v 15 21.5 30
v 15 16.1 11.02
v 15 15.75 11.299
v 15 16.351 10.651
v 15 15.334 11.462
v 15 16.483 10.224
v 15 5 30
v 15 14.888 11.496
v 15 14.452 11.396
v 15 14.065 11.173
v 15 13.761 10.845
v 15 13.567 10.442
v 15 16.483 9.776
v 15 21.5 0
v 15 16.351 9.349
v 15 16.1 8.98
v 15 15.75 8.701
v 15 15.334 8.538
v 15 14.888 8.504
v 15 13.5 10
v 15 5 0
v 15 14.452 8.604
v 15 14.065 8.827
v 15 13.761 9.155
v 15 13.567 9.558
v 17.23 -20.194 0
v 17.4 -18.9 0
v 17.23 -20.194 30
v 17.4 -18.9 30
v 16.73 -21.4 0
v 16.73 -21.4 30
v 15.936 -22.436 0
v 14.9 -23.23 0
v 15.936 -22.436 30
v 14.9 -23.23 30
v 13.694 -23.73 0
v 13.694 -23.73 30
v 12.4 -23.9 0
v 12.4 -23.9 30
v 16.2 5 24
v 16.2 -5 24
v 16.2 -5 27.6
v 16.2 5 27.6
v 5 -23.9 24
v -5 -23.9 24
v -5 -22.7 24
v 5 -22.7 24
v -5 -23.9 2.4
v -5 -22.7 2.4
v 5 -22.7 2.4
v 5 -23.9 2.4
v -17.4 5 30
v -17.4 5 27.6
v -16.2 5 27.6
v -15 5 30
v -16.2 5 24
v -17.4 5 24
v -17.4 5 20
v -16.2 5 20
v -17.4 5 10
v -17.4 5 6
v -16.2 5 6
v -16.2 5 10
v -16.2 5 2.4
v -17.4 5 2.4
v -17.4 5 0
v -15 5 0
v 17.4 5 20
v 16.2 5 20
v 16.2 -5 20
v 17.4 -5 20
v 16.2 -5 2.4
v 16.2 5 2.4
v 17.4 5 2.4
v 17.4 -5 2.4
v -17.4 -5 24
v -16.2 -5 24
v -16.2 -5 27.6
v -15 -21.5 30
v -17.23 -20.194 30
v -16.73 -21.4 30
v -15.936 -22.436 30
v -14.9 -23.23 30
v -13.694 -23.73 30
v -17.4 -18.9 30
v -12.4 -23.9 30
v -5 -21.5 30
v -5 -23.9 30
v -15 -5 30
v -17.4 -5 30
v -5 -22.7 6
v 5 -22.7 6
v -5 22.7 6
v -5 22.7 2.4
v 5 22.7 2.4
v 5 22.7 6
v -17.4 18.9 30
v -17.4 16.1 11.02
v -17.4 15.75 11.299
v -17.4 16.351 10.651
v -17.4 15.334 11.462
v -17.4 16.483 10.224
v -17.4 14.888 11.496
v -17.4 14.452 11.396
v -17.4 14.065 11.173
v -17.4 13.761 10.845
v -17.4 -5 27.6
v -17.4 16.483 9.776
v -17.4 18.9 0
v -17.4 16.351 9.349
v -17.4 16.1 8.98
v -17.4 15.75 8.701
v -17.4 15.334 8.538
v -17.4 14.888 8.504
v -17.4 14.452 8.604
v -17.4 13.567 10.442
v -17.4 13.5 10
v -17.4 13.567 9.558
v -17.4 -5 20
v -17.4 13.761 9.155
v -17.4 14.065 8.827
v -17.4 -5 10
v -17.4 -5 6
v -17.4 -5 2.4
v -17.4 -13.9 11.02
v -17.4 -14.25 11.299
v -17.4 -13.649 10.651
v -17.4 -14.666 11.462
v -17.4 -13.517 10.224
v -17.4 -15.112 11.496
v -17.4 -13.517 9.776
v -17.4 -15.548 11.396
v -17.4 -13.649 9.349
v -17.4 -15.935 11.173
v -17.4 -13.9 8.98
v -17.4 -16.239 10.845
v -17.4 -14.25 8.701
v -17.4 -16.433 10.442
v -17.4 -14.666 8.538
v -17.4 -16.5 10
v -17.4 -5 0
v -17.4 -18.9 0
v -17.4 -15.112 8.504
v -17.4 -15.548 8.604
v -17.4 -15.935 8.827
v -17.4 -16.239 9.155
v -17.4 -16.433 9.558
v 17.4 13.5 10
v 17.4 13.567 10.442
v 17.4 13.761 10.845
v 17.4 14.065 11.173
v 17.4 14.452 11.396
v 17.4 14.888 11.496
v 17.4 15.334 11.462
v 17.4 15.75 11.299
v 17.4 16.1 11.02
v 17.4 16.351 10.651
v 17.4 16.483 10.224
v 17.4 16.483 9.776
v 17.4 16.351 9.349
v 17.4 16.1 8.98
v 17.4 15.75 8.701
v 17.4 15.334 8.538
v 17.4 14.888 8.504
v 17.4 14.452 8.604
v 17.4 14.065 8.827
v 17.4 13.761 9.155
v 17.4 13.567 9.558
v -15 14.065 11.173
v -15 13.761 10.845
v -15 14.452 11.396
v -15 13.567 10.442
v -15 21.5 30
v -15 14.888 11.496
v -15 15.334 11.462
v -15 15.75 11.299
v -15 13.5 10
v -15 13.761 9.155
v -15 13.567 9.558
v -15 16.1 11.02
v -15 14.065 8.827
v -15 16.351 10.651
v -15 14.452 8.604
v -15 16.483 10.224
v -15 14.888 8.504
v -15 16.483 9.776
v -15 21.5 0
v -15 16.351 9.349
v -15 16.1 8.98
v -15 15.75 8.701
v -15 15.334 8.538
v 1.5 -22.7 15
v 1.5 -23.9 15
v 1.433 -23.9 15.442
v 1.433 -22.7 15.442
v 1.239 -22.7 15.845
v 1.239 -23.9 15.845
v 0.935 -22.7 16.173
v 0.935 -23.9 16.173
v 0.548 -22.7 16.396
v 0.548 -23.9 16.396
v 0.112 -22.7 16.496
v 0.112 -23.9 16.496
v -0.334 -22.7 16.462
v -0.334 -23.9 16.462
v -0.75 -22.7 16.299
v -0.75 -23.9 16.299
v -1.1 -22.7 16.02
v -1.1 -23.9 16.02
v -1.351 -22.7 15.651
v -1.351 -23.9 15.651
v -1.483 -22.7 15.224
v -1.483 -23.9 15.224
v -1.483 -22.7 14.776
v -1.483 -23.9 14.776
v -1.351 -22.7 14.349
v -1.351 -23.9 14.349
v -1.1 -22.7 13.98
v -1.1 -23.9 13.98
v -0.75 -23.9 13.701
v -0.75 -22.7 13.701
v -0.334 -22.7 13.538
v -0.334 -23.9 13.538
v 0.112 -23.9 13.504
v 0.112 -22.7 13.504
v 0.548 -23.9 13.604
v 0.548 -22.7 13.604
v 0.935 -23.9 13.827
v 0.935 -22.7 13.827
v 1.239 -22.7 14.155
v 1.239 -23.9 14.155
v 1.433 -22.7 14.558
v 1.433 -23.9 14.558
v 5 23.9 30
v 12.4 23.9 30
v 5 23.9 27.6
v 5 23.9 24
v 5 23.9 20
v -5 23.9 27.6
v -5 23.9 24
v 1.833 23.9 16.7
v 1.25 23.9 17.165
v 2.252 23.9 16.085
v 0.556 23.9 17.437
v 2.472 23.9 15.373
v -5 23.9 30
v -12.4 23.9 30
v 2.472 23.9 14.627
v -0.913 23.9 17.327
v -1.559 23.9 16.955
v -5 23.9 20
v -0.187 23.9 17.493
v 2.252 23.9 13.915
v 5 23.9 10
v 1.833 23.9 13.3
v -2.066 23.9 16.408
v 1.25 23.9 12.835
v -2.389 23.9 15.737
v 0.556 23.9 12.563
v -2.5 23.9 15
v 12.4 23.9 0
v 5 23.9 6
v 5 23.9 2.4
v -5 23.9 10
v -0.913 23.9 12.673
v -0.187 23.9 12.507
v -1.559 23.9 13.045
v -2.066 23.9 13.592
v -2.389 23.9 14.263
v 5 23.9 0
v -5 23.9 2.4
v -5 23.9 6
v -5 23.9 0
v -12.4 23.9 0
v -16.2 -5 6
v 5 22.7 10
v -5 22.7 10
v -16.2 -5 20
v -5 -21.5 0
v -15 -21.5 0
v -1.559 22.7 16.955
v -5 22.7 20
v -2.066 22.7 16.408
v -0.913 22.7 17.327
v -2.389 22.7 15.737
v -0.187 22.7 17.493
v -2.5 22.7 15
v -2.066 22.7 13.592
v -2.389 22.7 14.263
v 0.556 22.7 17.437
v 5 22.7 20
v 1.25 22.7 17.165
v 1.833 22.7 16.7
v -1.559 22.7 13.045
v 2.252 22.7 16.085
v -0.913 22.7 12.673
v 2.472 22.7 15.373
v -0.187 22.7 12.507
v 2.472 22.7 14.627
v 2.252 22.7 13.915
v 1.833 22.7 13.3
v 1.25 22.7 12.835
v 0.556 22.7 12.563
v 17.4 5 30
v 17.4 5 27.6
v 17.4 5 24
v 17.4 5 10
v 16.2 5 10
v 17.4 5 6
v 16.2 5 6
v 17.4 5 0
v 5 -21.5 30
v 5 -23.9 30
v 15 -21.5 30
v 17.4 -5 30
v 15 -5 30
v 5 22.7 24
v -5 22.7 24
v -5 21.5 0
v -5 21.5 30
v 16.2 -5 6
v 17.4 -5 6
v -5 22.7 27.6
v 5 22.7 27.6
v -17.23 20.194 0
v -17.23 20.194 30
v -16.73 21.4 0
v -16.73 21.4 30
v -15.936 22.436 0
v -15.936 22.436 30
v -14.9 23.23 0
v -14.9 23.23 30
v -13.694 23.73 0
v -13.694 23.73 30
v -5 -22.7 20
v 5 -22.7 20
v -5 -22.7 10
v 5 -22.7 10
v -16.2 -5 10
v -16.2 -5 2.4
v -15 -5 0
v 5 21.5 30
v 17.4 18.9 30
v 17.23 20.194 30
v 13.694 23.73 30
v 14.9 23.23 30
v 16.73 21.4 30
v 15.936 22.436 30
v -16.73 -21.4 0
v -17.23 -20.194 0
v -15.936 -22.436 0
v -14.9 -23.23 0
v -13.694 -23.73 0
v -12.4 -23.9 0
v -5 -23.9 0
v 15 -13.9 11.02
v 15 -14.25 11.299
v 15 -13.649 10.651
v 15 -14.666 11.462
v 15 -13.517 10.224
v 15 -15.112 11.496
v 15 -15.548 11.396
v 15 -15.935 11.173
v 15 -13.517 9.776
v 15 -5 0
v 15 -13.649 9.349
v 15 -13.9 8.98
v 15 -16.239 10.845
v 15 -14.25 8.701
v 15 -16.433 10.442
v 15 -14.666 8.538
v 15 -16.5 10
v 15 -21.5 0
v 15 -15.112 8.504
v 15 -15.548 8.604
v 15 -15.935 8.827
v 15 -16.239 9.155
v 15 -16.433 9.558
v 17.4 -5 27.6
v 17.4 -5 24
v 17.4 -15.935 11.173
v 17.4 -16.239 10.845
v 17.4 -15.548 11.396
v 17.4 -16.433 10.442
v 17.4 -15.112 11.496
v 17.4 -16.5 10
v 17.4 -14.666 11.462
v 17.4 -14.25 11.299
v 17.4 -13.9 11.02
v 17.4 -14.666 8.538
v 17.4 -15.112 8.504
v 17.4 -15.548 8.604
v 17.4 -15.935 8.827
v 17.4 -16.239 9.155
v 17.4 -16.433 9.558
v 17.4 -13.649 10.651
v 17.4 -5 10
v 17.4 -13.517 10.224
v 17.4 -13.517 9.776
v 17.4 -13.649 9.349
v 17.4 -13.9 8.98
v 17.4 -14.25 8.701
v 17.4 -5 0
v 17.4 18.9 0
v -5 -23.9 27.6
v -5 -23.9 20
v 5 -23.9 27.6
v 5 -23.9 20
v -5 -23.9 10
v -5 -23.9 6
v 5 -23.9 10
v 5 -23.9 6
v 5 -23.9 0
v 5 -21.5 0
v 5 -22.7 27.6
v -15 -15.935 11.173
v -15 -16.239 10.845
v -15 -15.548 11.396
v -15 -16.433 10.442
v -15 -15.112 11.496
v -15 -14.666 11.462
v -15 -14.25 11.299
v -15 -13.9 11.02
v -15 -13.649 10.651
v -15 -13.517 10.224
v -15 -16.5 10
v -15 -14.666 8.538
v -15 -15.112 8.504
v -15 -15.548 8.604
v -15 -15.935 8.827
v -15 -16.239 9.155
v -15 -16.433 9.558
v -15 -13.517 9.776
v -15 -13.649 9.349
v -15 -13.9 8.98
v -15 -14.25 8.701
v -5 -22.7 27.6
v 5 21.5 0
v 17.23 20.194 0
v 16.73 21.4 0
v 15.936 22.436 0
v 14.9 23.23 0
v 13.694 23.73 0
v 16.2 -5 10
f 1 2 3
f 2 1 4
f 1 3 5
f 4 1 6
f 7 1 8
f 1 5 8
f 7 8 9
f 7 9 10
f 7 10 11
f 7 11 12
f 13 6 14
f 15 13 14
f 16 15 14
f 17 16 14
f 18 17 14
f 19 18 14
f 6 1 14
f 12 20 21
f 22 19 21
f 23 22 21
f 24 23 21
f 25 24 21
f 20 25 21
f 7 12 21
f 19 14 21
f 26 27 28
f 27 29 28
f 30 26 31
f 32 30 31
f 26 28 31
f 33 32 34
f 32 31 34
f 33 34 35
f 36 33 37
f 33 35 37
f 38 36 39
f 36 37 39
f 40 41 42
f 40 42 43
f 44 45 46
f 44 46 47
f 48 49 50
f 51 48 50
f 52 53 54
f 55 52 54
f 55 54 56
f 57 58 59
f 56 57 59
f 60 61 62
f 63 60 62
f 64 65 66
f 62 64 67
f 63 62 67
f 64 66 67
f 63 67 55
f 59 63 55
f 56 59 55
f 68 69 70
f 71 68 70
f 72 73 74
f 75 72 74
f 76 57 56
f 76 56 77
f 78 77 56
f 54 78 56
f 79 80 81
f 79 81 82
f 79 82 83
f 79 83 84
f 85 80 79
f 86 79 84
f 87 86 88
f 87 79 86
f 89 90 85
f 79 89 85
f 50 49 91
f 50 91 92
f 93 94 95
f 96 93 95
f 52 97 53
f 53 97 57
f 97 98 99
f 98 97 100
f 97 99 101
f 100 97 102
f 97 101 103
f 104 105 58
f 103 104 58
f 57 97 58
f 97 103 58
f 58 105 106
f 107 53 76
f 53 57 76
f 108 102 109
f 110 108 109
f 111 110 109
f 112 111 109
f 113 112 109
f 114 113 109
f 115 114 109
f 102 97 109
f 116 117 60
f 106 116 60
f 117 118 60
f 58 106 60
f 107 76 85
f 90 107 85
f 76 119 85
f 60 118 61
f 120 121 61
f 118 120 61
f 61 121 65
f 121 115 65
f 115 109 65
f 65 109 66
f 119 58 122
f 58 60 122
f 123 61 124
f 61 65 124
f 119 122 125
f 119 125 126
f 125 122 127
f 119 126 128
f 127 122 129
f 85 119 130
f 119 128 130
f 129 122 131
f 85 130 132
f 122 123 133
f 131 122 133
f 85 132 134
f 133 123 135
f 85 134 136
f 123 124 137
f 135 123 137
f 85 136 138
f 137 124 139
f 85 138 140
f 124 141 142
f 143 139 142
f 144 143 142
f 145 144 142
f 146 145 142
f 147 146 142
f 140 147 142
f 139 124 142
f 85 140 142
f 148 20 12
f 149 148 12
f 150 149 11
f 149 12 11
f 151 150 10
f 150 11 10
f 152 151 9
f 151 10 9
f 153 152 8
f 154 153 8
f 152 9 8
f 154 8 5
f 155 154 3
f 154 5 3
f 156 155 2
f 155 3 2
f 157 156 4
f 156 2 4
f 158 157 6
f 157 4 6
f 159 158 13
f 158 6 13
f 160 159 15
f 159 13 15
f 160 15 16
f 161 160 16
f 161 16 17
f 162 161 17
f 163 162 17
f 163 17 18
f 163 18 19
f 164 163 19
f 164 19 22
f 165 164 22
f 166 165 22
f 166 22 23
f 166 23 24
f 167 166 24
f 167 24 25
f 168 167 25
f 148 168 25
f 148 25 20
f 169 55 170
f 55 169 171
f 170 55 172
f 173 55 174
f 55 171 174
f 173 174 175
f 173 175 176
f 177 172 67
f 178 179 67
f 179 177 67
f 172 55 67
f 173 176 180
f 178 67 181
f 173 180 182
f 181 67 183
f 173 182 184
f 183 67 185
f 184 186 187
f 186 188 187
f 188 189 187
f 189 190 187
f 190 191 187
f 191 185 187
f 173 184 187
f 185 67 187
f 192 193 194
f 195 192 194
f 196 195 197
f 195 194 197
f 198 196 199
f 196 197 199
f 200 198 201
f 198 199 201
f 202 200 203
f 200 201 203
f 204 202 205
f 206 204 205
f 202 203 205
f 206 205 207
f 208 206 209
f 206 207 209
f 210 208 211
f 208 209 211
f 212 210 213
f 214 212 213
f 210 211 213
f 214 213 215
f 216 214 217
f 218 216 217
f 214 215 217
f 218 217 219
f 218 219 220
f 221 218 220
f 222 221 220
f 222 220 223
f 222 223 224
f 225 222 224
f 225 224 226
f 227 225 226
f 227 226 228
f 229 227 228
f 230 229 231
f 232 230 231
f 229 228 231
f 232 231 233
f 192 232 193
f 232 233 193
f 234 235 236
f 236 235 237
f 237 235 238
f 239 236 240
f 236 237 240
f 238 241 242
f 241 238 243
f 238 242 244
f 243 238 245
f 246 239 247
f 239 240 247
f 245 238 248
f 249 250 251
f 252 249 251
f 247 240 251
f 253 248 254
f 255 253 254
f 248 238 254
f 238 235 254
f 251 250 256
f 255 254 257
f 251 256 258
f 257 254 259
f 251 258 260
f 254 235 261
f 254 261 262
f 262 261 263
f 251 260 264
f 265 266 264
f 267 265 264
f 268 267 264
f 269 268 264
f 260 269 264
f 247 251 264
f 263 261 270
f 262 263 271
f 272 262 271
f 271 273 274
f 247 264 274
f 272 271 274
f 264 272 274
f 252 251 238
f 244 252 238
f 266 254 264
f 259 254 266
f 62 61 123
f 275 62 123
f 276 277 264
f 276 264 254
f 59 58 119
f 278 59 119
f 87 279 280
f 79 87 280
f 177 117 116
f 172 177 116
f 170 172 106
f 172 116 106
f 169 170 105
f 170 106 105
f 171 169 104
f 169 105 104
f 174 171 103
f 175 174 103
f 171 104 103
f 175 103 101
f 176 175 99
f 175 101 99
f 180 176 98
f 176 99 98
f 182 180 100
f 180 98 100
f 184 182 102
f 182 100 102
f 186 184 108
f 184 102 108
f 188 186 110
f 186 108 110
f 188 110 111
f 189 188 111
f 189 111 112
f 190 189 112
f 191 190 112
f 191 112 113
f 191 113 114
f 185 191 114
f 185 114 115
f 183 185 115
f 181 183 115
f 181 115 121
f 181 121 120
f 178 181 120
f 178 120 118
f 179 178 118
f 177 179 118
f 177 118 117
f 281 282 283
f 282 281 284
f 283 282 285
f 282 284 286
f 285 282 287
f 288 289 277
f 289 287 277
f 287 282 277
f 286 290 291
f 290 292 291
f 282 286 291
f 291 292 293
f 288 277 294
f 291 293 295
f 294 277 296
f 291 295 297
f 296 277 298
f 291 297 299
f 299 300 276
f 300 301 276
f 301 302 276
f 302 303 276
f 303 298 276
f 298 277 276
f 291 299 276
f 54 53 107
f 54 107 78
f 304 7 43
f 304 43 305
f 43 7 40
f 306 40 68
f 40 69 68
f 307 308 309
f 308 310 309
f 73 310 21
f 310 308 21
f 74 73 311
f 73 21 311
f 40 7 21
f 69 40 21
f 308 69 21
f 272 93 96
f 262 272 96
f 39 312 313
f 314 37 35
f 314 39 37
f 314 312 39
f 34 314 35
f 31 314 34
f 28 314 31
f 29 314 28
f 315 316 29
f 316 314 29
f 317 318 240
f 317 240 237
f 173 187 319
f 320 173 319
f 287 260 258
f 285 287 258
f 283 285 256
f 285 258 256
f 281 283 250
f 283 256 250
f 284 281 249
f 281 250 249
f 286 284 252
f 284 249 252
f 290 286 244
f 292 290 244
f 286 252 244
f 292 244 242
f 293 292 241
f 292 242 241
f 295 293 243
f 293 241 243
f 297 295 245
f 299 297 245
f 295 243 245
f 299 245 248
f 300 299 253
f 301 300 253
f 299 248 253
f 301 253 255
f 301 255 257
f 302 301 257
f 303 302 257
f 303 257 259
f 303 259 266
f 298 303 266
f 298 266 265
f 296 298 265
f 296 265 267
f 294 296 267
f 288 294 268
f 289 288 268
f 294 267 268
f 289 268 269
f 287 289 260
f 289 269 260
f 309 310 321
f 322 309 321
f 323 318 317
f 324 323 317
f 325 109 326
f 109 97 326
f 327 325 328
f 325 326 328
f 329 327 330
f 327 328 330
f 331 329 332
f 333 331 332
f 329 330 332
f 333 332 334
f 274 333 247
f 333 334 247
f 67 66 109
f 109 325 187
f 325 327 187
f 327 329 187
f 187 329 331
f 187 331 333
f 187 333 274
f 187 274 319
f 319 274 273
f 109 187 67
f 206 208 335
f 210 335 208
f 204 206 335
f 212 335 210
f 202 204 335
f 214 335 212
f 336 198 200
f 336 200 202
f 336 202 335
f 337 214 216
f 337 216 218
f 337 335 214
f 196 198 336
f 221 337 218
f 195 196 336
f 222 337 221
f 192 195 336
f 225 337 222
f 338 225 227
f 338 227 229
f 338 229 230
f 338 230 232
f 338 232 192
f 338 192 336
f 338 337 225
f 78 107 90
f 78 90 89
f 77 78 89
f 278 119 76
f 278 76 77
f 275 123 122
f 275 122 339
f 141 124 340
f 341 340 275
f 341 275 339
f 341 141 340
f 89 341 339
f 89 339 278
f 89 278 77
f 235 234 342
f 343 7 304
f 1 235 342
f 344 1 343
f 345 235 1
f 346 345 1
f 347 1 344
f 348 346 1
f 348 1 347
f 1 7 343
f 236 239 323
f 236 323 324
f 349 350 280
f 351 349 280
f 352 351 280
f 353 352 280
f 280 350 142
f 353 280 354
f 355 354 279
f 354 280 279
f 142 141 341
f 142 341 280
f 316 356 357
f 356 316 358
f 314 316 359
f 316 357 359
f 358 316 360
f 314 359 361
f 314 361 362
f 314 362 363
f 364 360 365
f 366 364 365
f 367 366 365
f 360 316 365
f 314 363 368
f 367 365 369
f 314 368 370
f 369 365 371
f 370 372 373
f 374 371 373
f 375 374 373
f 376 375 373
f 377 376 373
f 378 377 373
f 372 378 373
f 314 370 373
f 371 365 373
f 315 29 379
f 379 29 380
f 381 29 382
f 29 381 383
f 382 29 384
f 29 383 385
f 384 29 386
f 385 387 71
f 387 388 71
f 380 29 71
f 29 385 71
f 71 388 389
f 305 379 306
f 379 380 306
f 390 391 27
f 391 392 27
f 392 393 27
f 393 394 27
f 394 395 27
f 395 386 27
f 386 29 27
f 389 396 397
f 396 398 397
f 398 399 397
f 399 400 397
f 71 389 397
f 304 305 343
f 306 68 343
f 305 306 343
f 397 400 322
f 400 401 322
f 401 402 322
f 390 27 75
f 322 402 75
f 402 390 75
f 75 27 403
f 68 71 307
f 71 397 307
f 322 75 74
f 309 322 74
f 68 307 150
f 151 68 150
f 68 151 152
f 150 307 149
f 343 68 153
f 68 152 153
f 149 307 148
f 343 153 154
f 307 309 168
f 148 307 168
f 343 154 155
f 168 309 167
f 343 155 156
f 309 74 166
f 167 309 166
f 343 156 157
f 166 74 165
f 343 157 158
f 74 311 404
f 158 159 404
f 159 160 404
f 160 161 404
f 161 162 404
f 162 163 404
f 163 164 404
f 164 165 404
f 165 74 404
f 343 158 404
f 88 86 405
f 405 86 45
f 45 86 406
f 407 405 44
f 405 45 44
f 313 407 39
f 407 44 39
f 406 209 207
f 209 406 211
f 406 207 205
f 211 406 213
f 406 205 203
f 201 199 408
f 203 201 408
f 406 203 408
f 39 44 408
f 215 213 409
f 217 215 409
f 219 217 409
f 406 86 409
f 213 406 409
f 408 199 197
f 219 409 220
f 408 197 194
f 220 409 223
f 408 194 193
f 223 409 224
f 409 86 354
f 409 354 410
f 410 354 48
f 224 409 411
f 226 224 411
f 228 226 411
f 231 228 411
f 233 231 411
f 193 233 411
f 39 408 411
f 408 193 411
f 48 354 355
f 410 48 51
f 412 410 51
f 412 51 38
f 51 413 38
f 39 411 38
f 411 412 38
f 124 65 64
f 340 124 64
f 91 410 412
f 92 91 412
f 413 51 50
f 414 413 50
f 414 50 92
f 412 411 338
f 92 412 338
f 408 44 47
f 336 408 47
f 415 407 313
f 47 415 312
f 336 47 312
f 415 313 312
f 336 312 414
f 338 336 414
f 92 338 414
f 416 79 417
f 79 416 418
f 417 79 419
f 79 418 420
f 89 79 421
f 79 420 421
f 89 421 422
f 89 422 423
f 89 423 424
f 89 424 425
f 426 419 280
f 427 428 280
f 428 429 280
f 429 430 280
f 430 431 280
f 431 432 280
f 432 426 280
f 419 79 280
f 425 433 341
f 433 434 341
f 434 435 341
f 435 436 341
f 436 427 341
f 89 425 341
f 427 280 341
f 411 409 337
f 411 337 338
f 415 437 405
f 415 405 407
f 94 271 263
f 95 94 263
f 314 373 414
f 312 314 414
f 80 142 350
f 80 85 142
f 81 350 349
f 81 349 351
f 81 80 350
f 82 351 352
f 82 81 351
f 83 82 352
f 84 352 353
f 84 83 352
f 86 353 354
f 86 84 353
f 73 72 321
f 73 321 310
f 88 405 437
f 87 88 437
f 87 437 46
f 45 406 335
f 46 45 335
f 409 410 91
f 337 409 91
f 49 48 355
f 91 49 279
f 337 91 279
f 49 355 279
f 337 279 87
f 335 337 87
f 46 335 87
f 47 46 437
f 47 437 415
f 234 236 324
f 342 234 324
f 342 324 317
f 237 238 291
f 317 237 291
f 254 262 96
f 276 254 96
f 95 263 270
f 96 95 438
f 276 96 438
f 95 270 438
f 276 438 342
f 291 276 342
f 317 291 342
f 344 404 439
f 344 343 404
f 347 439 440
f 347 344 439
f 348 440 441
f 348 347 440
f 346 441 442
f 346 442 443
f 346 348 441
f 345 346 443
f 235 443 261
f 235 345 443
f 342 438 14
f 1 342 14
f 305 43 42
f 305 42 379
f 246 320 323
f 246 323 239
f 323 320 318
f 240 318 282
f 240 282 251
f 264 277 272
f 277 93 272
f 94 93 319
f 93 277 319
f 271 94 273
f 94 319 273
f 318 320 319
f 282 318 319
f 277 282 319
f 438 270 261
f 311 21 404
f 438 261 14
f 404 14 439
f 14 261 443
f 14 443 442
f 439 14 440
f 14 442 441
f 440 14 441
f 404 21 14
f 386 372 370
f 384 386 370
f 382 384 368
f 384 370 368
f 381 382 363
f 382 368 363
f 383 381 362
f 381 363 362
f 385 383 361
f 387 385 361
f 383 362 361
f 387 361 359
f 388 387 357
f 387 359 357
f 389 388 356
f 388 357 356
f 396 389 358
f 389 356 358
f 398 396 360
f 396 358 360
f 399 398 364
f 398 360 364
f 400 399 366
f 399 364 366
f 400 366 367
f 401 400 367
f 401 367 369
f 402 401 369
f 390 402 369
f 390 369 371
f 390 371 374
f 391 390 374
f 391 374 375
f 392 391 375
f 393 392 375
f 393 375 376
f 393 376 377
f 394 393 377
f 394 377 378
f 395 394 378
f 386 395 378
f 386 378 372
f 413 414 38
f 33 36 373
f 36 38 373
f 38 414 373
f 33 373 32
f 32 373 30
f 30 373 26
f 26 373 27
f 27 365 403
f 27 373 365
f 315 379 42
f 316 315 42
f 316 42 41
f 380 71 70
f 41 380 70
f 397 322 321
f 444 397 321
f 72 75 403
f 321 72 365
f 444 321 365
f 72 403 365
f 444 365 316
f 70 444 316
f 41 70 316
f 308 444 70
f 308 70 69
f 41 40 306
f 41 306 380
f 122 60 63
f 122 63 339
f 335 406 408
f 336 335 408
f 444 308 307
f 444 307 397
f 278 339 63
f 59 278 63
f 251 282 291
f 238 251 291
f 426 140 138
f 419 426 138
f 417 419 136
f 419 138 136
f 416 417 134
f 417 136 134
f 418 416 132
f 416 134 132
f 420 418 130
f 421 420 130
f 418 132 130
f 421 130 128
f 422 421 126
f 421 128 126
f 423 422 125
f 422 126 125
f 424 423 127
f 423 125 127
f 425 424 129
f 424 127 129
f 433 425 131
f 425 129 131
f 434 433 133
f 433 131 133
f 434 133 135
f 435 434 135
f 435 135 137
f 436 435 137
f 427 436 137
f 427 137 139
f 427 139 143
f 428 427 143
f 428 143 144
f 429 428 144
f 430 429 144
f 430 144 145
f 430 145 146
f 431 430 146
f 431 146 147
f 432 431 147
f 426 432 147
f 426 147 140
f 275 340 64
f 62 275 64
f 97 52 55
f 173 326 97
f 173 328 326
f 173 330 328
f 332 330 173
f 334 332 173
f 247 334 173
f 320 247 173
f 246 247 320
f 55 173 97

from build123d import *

# Parameters (mm, degrees)
F0_W      = 1.2
F0_H      = 10
F0_W_2    = 10
F0_H_2    = 1.2
F1_DEPTH  = 30
F2_W      = 10
F2_H      = 4
F3_DEPTH  = 47.801
F4_W      = 10
F4_H      = 4
F5_DEPTH  = 34.801
F6_W      = 10
F6_H      = 1.2
F6_W_2    = 1.2
F6_H_2    = 10
F7_DEPTH  = 2.4
F8_DEPTH  = 2.4
F9_R      = 5
F2_R      = 1.5
F10_DEPTH = 1.2
F11_R     = 2.5
F12_DEPTH = 1.2
F4_R      = 1.5
F13_DEPTH = 34.801


with BuildPart() as f1:
    # F0 (on Top) → F1 (new body)
    with BuildSketch(Plane.XY):
        Polygon((15, -5), (15, -21.5), (5, -21.5), (5, -22.7), (5, -23.9), (17.4, -23.9), (17.4, -5), (16.2, -5), align=None)
        with Locations((16.8, 0)):
            Rectangle(F0_W, F0_H)
        Polygon((15, 5), (16.2, 5), (17.4, 5), (17.4, 23.9), (5, 23.9), (5, 22.7), (5, 21.5), (15, 21.5), align=None)
        with Locations((0, 23.3)):
            Rectangle(F0_W_2, F0_H_2)
        Polygon((-17.4, 23.9), (-17.4, 5), (-16.2, 5), (-15, 5), (-15, 21.5), (-5, 21.5), (-5, 22.7), (-5, 23.9), align=None)
        Polygon((-5, -23.9), (-5, -22.7), (-5, -21.5), (-15, -21.5), (-15, -5), (-16.2, -5), (-17.4, -5), (-17.4, -23.9), align=None)
        with Locations((0, -23.3)):
            Rectangle(F0_W_2, F0_H_2)
        with Locations((-16.8, 0)):
            Rectangle(F0_W, F0_H)
    extrude(amount=F1_DEPTH)

    # F2 (on face) → F3 (cut, through all)
    with BuildSketch(Plane.XZ.offset(23.9)):
        with Locations((0, 22)):
            Rectangle(F2_W, F2_H)
        with Locations((0, 8)):
            Rectangle(F2_W, F2_H)
    extrude(amount=-F3_DEPTH, mode=Mode.SUBTRACT)

    # F4 (on face) → F5 (cut, through all)
    with BuildSketch(Plane(origin=(-17.4, 0, 0), x_dir=(0, -1, 0), z_dir=(-1, 0, 0))):
        with Locations((0, 22)):
            Rectangle(F4_W, F4_H)
        with Locations((0, 8)):
            Rectangle(F4_W, F4_H)
    extrude(amount=-F5_DEPTH, mode=Mode.SUBTRACT)

    # F6 (on face) → F7 (cut)
    with BuildSketch(Plane.XY.offset(30)):
        with Locations((0, 23.3)):
            Rectangle(F6_W, F6_H)
        with Locations((16.8, 0)):
            Rectangle(F6_W_2, F6_H_2)
        with Locations((-16.8, 0)):
            Rectangle(F6_W_2, F6_H_2)
        with Locations((0, -23.3)):
            Rectangle(F6_W, F6_H)
    extrude(amount=-F7_DEPTH, mode=Mode.SUBTRACT)

    # F0 (on Top) → F8 (cut)
    with BuildSketch(Plane.XY):
        with Locations((16.8, 0)):
            Rectangle(F0_W, F0_H)
        with Locations((0, 23.3)):
            Rectangle(F0_W_2, F0_H_2)
        with Locations((0, -23.3)):
            Rectangle(F0_W_2, F0_H_2)
        with Locations((-16.8, 0)):
            Rectangle(F0_W, F0_H)
    extrude(amount=F8_DEPTH, mode=Mode.SUBTRACT)

    # F9
    f9_edges = [f1.edges().sort_by_distance(p)[0] for p in [
        (-17.4, -23.9, 15),
        (-17.4, 23.9, 15),
        (17.4, -23.9, 15),
        (17.4, 23.9, 15),
    ]]
    fillet(f9_edges, radius=F9_R)

    # F2 (on face) → F10 (cut, through all)
    with BuildSketch(Plane.XZ.offset(23.9)):
        with Locations((0, 15)):
            Circle(F2_R)
    extrude(amount=-F10_DEPTH, mode=Mode.SUBTRACT)

    # F11 (on face) → F12 (cut, through all)
    with BuildSketch(Plane(origin=(0, 23.9, 0), x_dir=(-1, 0, 0), z_dir=(0, 1, 0))):
        with Locations((0, 15)):
            Circle(F11_R)
    extrude(amount=-F12_DEPTH, mode=Mode.SUBTRACT)

    # F4 (on face) → F13 (cut, through all)
    with BuildSketch(Plane(origin=(-17.4, 0, 0), x_dir=(0, -1, 0), z_dir=(-1, 0, 0))):
        with Locations((-15, 10)):
            Circle(F4_R)
        with Locations((15, 10)):
            Circle(F4_R)
    extrude(amount=-F13_DEPTH, mode=Mode.SUBTRACT)


solid = f1.part
